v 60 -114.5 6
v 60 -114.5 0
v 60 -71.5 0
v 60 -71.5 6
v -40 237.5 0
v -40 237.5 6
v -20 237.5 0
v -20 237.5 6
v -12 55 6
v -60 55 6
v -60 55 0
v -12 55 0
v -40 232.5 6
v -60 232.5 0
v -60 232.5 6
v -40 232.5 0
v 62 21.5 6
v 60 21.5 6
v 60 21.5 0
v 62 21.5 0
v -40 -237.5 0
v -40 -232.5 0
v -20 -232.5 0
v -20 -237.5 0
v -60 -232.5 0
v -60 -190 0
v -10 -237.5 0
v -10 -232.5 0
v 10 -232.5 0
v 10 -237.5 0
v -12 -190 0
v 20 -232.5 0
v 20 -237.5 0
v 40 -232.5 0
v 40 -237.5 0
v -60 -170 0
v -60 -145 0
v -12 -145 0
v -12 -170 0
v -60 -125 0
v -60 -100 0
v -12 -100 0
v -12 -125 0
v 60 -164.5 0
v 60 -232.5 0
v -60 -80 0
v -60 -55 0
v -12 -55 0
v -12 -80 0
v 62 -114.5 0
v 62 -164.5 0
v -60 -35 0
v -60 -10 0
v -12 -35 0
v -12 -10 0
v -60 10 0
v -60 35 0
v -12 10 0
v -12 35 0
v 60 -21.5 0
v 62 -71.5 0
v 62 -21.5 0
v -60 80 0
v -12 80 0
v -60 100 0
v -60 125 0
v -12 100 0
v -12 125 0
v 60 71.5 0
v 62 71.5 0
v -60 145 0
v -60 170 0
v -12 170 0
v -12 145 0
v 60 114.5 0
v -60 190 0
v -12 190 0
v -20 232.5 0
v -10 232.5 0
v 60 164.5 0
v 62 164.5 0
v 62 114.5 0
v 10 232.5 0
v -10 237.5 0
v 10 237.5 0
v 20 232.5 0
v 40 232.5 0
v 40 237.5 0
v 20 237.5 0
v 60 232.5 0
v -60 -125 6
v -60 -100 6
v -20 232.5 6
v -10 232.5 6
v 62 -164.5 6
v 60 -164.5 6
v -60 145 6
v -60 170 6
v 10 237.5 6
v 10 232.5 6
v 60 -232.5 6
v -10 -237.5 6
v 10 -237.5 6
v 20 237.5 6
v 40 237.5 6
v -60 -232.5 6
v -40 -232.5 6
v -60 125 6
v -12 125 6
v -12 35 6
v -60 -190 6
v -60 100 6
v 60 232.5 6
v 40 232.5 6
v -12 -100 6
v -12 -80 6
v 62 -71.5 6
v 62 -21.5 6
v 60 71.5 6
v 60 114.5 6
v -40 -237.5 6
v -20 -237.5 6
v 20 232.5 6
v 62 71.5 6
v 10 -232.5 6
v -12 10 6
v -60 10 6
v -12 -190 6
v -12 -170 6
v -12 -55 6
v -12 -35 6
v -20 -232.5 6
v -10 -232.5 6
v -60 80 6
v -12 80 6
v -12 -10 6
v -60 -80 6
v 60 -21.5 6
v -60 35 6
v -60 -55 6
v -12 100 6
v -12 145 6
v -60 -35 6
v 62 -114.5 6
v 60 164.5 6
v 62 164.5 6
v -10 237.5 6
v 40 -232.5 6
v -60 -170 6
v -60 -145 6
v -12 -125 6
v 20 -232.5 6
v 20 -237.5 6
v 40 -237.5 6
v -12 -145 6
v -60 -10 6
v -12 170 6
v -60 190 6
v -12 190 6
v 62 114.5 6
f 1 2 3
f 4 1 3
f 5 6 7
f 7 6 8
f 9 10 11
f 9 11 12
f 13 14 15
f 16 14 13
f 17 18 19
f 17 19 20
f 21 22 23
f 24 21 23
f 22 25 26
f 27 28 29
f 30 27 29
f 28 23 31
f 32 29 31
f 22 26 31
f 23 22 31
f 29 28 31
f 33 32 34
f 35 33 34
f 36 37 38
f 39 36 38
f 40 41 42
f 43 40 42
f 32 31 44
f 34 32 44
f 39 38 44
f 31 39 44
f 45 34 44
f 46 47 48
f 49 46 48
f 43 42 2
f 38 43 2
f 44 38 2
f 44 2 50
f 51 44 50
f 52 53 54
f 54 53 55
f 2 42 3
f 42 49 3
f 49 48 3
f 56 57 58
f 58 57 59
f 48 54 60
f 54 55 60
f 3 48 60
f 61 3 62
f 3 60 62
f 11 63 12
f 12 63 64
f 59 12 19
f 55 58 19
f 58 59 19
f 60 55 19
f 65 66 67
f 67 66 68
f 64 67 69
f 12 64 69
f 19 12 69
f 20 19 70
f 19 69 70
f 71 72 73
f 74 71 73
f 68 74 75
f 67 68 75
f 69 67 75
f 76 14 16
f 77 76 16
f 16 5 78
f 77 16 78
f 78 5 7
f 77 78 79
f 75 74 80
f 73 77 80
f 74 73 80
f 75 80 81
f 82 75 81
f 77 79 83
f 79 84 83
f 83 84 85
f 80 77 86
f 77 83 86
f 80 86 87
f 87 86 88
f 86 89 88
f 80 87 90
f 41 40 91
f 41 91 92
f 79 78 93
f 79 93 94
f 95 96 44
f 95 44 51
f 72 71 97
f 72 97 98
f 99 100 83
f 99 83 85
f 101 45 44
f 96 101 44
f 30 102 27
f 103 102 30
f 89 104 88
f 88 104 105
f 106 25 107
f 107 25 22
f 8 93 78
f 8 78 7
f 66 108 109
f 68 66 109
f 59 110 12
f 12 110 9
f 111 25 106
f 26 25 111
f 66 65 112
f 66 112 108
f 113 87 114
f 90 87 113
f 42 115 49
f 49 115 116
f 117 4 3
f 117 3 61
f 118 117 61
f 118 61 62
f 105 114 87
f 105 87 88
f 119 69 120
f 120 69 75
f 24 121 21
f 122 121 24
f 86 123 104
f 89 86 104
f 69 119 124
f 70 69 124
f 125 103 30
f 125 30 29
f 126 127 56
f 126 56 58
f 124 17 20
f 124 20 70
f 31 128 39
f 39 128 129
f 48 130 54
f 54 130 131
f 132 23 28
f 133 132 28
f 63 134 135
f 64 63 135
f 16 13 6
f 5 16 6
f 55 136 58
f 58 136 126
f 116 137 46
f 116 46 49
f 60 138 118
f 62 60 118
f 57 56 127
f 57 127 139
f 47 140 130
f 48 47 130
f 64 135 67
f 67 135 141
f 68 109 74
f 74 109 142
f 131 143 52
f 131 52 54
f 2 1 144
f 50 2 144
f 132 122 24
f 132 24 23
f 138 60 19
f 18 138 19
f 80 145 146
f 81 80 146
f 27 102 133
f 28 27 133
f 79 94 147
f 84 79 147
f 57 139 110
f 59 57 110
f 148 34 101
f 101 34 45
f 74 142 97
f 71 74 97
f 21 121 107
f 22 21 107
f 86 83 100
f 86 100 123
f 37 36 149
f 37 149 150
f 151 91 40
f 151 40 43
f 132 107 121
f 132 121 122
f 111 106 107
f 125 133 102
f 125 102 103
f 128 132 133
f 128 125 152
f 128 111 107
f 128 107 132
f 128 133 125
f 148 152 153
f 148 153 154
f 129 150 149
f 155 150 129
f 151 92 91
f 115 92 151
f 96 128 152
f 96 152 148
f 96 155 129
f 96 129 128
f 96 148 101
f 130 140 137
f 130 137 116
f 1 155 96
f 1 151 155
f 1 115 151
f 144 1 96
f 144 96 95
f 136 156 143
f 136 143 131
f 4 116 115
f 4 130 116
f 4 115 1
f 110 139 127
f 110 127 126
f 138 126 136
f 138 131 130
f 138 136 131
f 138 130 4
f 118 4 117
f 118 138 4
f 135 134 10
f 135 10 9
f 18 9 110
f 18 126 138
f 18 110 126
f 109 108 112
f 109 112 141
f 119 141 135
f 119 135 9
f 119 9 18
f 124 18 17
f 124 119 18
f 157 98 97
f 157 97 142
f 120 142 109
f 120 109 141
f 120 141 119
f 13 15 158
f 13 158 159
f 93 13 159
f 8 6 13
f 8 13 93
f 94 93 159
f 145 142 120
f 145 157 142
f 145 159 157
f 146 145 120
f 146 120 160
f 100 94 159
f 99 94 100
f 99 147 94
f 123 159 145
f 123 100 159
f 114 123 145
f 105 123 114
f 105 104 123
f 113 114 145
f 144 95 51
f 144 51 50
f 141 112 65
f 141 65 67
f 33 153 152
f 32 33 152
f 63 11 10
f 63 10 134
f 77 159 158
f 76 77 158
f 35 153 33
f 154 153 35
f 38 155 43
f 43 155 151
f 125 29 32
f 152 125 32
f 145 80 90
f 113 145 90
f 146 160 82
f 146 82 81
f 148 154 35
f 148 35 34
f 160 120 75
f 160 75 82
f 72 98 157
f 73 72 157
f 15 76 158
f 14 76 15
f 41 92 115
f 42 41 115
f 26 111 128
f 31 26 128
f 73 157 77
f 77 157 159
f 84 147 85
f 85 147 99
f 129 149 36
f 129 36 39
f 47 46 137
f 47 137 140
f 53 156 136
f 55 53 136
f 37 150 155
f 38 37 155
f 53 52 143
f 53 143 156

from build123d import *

# Parameters (mm, degrees)
SKETCH1_W           = 120
SKETCH1_H           = 465
BOSS_EXTRUDE1_DEPTH = 6
SKETCH2_W           = 30
SKETCH2_H           = 20
CUT_EXTRUDE1_DEPTH  = 8
SKETCH4_W           = 20
SKETCH4_H           = 10
SKETCH4_W_2         = 4
SKETCH4_H_2         = 50
BOSS_EXTRUDE2_DEPTH = 6
SKETCH5_W           = 18
SKETCH5_H           = 20
CUT_EXTRUDE2_DEPTH  = 10


with BuildPart() as part:
    # Sketch1 → Boss-Extrude1 (new body)
    with BuildSketch(Plane.XY):
        Rectangle(SKETCH1_W, SKETCH1_H)
    extrude(amount=BOSS_EXTRUDE1_DEPTH)

    # Sketch2 → Cut-Extrude1 (cut)
    with BuildSketch(Plane.XY.offset(6)):
        Polygon((-12, 190), (-42, 190), (-42, 180), (-42, 170), (-12, 170), align=None)
        Polygon((-12, 145), (-42, 145), (-42, 135), (-42, 125), (-12, 125), align=None)
        with Locations((-27, 90)):
            Rectangle(SKETCH2_W, SKETCH2_H)
        with Locations((-27, 45)):
            Rectangle(SKETCH2_W, SKETCH2_H)
        with Locations((-27, 0)):
            Rectangle(SKETCH2_W, SKETCH2_H)
        with Locations((-27, -45)):
            Rectangle(SKETCH2_W, SKETCH2_H)
        with Locations((-27, -90)):
            Rectangle(SKETCH2_W, SKETCH2_H)
        with Locations((-27, -135)):
            Rectangle(SKETCH2_W, SKETCH2_H)
        with Locations((-27, -180)):
            Rectangle(SKETCH2_W, SKETCH2_H)
    extrude(amount=-CUT_EXTRUDE1_DEPTH, mode=Mode.SUBTRACT)

    # Sketch4 → Boss-Extrude2 (add)
    with BuildSketch(Plane.XY.offset(6)):
        with Locations((-30, 232.5)):
            Rectangle(SKETCH4_W, SKETCH4_H)
        with Locations((0, 232.5)):
            Rectangle(SKETCH4_W, SKETCH4_H)
        with Locations((30, 232.5)):
            Rectangle(SKETCH4_W, SKETCH4_H)
        with Locations((-30, -232.5)):
            Rectangle(SKETCH4_W, SKETCH4_H)
        with Locations((0, -232.5)):
            Rectangle(SKETCH4_W, SKETCH4_H)
        with Locations((30, -232.5)):
            Rectangle(SKETCH4_W, SKETCH4_H)
        with Locations((60, 139.5)):
            Rectangle(SKETCH4_W_2, SKETCH4_H_2)
        with Locations((60, 46.5)):
            Rectangle(SKETCH4_W_2, SKETCH4_H_2)
        with Locations((60, -46.5)):
            Rectangle(SKETCH4_W_2, SKETCH4_H_2)
        with Locations((60, -139.5)):
            Rectangle(SKETCH4_W_2, SKETCH4_H_2)
    extrude(amount=-BOSS_EXTRUDE2_DEPTH)

    # Sketch5 → Cut-Extrude2 (cut)
    with BuildSketch(Plane.XY.offset(6)):
        with Locations((-51, 180)):
            Rectangle(SKETCH5_W, SKETCH5_H)
        with Locations((-51, 135)):
            Rectangle(SKETCH5_W, SKETCH5_H)
        with Locations((-51, 90)):
            Rectangle(SKETCH5_W, SKETCH5_H)
        with Locations((-51, 45)):
            Rectangle(SKETCH5_W, SKETCH5_H)
        with Locations((-51, 0)):
            Rectangle(SKETCH5_W, SKETCH5_H)
        with Locations((-51, -45)):
            Rectangle(SKETCH5_W, SKETCH5_H)
        with Locations((-51, -90)):
            Rectangle(SKETCH5_W, SKETCH5_H)
        with Locations((-51, -135)):
            Rectangle(SKETCH5_W, SKETCH5_H)
        with Locations((-51, -180)):
            Rectangle(SKETCH5_W, SKETCH5_H)
    extrude(amount=-CUT_EXTRUDE2_DEPTH, mode=Mode.SUBTRACT)


solid = part.part
